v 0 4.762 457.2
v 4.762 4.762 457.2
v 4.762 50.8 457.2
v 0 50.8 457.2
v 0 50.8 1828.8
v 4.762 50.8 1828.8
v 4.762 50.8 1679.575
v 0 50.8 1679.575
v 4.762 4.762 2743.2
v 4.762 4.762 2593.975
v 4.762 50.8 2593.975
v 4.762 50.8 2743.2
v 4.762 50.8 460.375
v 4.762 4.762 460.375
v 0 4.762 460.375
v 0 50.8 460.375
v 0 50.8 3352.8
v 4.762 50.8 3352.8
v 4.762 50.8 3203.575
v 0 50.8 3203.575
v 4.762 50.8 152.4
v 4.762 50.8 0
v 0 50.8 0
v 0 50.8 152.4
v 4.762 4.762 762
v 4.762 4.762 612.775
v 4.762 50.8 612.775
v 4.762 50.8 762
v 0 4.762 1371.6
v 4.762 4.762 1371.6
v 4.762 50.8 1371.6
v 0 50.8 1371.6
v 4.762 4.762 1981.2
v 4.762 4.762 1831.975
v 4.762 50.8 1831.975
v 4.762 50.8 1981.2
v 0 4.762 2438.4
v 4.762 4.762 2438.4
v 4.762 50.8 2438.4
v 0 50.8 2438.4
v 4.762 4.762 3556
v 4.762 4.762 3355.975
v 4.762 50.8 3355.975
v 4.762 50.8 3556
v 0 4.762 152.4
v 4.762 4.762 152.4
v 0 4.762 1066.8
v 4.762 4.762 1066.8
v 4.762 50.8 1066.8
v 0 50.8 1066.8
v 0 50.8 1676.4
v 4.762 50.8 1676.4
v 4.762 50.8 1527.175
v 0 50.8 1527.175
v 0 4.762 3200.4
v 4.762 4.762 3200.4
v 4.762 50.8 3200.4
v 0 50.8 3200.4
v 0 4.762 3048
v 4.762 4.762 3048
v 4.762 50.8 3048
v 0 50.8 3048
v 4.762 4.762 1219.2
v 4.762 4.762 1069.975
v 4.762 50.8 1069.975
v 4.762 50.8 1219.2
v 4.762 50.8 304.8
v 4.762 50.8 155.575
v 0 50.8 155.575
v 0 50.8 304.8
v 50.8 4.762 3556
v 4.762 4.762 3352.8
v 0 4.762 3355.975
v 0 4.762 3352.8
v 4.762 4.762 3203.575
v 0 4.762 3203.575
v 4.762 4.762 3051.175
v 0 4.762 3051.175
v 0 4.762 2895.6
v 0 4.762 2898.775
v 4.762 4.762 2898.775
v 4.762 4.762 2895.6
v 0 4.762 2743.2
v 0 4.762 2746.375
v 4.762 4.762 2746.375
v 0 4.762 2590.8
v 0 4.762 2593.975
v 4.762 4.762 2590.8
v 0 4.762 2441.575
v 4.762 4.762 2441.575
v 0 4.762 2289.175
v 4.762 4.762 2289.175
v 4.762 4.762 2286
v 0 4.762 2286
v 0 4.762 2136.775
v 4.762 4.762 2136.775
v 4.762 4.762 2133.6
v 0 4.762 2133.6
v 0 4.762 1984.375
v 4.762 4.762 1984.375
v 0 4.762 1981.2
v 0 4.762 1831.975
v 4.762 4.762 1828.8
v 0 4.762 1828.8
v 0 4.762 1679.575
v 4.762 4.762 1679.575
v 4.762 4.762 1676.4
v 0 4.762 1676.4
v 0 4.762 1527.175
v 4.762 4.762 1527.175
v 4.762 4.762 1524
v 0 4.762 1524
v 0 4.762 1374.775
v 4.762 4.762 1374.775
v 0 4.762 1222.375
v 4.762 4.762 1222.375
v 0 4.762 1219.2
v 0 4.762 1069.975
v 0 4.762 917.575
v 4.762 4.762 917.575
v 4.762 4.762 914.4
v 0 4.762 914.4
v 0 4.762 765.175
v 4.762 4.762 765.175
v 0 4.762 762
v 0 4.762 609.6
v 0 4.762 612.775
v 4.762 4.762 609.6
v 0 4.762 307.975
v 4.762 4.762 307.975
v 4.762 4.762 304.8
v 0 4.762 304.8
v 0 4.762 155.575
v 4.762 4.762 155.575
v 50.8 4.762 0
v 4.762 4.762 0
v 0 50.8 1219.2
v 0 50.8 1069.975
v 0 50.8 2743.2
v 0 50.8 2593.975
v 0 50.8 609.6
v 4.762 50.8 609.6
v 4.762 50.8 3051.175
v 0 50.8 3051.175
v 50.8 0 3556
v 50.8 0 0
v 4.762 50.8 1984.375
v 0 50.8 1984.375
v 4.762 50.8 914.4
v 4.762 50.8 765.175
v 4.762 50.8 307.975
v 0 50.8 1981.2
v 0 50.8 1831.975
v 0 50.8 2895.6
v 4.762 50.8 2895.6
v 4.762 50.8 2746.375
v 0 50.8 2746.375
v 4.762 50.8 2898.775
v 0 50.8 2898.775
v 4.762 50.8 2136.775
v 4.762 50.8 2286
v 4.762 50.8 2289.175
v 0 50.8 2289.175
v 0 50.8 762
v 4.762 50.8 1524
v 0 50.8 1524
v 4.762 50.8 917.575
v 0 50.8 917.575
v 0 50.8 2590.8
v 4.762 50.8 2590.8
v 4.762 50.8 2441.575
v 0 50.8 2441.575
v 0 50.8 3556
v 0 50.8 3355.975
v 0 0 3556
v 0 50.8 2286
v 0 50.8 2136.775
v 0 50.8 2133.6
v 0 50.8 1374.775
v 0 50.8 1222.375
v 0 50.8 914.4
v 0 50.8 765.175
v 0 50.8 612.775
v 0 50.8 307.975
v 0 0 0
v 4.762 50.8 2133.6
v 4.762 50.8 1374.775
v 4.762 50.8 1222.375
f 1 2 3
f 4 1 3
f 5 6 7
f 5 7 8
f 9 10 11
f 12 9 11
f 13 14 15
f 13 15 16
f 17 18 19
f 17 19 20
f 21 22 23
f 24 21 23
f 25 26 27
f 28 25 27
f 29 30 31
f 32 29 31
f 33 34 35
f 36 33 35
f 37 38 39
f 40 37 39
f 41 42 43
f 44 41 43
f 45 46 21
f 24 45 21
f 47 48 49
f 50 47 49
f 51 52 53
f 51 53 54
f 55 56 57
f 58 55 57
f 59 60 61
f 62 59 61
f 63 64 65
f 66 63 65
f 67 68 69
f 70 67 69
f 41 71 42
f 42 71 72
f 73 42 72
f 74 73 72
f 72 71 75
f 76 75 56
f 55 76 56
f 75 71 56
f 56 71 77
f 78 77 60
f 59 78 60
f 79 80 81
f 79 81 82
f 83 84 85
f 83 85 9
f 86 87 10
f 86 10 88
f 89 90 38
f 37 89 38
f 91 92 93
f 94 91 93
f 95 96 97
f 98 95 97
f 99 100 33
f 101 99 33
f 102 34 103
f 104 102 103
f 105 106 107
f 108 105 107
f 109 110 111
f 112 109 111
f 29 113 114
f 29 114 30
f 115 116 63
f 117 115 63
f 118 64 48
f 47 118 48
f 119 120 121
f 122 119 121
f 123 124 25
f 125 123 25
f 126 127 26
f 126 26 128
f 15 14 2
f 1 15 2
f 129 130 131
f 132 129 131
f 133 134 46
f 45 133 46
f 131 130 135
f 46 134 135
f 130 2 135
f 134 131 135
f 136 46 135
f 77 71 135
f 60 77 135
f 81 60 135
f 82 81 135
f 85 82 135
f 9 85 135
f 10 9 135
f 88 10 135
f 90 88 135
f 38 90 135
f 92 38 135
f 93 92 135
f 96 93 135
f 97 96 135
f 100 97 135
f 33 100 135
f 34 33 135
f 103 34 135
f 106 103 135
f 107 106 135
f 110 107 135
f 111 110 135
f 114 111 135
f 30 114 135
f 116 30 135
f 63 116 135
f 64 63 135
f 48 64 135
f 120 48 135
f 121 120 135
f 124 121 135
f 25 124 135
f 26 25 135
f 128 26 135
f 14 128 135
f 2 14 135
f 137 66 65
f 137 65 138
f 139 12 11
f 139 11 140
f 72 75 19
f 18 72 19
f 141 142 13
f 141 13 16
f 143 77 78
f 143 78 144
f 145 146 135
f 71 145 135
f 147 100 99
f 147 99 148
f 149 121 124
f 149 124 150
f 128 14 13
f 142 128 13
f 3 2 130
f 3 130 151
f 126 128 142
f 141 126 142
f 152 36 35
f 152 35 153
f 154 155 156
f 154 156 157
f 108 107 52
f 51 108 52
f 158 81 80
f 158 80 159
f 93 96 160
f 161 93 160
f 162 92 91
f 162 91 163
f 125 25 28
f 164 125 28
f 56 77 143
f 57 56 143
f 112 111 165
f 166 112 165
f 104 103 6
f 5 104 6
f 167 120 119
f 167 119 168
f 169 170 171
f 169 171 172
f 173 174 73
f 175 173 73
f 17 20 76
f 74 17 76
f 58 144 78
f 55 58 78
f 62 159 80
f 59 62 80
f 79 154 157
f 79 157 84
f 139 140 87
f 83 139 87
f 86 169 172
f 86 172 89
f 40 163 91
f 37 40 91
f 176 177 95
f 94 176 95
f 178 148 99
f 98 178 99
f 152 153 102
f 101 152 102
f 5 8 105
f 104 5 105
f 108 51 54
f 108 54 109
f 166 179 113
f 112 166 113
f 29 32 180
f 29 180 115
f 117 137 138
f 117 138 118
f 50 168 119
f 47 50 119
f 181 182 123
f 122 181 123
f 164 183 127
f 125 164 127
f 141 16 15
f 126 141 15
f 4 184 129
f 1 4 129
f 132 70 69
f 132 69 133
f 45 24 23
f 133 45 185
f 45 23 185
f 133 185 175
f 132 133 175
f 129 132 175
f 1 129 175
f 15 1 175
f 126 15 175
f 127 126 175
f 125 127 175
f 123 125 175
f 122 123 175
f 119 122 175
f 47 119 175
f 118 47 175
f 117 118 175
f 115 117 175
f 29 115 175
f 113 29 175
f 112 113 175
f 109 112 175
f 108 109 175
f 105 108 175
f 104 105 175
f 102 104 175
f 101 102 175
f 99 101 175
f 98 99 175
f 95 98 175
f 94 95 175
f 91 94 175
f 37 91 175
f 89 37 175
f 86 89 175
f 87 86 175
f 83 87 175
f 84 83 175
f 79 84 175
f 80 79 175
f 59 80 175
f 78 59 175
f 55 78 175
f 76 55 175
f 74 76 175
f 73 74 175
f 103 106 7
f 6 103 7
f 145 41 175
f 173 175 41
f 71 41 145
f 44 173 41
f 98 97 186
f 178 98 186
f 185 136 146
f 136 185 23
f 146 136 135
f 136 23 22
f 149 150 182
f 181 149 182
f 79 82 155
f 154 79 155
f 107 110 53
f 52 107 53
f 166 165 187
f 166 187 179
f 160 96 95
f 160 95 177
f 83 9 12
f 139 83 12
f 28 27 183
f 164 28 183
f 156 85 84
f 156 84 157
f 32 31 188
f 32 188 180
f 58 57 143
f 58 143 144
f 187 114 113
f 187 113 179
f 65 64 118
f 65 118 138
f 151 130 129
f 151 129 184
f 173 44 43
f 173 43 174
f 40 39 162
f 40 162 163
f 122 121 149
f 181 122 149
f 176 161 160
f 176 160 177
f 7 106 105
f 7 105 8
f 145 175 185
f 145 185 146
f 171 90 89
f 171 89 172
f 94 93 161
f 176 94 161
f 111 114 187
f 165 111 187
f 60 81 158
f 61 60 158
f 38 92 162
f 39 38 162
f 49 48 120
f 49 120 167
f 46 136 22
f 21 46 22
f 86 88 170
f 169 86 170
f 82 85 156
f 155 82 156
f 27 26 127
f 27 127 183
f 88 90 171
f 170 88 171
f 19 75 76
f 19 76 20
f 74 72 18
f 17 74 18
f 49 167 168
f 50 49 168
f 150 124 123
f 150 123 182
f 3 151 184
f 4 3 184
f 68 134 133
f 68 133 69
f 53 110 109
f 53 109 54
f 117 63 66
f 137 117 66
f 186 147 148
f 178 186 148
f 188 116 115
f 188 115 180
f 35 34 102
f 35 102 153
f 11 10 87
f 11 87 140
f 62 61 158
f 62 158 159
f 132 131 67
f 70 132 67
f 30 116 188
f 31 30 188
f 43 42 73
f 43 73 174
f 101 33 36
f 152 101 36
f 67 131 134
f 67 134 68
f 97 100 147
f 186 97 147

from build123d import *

# Parameters (mm, degrees)
BOSS_EXTRUDE1_DEPTH = 3556
CUT_EXTRUDE1_REACH  = 3558.661
SKETCH2_W           = 3.175
SKETCH2_H           = 46.0375
LPATTERN1_COUNT     = 22
LPATTERN1_PITCH     = 152.4


with BuildPart() as part:
    # Sketch1 → Boss-Extrude1 (new body)
    with BuildSketch(Plane.XY):
        Polygon((0, 0), (50.8, 0), (50.8, 4.7625), (4.7625, 4.7625), (4.7625, 50.8), (0, 50.8), align=None)
    extrude(amount=BOSS_EXTRUDE1_DEPTH)

    # Sketch2 → Cut-Extrude1 (cut, up to next)
    with BuildSketch(Plane(origin=(4.7625, 0, 0), x_dir=(0, 0, -1), z_dir=(1, 0, 0)), mode=Mode.PRIVATE) as cut_extrude1_sk1:
        with Locations((-153.9875, 27.78125)):
            Rectangle(SKETCH2_W, SKETCH2_H)
    cut_extrude1_tool1 = extrude(cut_extrude1_sk1.sketch, amount=-CUT_EXTRUDE1_REACH, mode=Mode.PRIVATE) & part.part
    cut_extrude1 = cut_extrude1_tool1.solids().sort_by_distance((4.7625, 27.78125, 153.9875))[0]
    add(cut_extrude1, mode=Mode.SUBTRACT)

    # LPattern1: Cut-Extrude1 ×22
    with Locations(*[(0, 0, i * LPATTERN1_PITCH) for i in range(1, LPATTERN1_COUNT)]):
        add(cut_extrude1, mode=Mode.SUBTRACT)


solid = part.part
